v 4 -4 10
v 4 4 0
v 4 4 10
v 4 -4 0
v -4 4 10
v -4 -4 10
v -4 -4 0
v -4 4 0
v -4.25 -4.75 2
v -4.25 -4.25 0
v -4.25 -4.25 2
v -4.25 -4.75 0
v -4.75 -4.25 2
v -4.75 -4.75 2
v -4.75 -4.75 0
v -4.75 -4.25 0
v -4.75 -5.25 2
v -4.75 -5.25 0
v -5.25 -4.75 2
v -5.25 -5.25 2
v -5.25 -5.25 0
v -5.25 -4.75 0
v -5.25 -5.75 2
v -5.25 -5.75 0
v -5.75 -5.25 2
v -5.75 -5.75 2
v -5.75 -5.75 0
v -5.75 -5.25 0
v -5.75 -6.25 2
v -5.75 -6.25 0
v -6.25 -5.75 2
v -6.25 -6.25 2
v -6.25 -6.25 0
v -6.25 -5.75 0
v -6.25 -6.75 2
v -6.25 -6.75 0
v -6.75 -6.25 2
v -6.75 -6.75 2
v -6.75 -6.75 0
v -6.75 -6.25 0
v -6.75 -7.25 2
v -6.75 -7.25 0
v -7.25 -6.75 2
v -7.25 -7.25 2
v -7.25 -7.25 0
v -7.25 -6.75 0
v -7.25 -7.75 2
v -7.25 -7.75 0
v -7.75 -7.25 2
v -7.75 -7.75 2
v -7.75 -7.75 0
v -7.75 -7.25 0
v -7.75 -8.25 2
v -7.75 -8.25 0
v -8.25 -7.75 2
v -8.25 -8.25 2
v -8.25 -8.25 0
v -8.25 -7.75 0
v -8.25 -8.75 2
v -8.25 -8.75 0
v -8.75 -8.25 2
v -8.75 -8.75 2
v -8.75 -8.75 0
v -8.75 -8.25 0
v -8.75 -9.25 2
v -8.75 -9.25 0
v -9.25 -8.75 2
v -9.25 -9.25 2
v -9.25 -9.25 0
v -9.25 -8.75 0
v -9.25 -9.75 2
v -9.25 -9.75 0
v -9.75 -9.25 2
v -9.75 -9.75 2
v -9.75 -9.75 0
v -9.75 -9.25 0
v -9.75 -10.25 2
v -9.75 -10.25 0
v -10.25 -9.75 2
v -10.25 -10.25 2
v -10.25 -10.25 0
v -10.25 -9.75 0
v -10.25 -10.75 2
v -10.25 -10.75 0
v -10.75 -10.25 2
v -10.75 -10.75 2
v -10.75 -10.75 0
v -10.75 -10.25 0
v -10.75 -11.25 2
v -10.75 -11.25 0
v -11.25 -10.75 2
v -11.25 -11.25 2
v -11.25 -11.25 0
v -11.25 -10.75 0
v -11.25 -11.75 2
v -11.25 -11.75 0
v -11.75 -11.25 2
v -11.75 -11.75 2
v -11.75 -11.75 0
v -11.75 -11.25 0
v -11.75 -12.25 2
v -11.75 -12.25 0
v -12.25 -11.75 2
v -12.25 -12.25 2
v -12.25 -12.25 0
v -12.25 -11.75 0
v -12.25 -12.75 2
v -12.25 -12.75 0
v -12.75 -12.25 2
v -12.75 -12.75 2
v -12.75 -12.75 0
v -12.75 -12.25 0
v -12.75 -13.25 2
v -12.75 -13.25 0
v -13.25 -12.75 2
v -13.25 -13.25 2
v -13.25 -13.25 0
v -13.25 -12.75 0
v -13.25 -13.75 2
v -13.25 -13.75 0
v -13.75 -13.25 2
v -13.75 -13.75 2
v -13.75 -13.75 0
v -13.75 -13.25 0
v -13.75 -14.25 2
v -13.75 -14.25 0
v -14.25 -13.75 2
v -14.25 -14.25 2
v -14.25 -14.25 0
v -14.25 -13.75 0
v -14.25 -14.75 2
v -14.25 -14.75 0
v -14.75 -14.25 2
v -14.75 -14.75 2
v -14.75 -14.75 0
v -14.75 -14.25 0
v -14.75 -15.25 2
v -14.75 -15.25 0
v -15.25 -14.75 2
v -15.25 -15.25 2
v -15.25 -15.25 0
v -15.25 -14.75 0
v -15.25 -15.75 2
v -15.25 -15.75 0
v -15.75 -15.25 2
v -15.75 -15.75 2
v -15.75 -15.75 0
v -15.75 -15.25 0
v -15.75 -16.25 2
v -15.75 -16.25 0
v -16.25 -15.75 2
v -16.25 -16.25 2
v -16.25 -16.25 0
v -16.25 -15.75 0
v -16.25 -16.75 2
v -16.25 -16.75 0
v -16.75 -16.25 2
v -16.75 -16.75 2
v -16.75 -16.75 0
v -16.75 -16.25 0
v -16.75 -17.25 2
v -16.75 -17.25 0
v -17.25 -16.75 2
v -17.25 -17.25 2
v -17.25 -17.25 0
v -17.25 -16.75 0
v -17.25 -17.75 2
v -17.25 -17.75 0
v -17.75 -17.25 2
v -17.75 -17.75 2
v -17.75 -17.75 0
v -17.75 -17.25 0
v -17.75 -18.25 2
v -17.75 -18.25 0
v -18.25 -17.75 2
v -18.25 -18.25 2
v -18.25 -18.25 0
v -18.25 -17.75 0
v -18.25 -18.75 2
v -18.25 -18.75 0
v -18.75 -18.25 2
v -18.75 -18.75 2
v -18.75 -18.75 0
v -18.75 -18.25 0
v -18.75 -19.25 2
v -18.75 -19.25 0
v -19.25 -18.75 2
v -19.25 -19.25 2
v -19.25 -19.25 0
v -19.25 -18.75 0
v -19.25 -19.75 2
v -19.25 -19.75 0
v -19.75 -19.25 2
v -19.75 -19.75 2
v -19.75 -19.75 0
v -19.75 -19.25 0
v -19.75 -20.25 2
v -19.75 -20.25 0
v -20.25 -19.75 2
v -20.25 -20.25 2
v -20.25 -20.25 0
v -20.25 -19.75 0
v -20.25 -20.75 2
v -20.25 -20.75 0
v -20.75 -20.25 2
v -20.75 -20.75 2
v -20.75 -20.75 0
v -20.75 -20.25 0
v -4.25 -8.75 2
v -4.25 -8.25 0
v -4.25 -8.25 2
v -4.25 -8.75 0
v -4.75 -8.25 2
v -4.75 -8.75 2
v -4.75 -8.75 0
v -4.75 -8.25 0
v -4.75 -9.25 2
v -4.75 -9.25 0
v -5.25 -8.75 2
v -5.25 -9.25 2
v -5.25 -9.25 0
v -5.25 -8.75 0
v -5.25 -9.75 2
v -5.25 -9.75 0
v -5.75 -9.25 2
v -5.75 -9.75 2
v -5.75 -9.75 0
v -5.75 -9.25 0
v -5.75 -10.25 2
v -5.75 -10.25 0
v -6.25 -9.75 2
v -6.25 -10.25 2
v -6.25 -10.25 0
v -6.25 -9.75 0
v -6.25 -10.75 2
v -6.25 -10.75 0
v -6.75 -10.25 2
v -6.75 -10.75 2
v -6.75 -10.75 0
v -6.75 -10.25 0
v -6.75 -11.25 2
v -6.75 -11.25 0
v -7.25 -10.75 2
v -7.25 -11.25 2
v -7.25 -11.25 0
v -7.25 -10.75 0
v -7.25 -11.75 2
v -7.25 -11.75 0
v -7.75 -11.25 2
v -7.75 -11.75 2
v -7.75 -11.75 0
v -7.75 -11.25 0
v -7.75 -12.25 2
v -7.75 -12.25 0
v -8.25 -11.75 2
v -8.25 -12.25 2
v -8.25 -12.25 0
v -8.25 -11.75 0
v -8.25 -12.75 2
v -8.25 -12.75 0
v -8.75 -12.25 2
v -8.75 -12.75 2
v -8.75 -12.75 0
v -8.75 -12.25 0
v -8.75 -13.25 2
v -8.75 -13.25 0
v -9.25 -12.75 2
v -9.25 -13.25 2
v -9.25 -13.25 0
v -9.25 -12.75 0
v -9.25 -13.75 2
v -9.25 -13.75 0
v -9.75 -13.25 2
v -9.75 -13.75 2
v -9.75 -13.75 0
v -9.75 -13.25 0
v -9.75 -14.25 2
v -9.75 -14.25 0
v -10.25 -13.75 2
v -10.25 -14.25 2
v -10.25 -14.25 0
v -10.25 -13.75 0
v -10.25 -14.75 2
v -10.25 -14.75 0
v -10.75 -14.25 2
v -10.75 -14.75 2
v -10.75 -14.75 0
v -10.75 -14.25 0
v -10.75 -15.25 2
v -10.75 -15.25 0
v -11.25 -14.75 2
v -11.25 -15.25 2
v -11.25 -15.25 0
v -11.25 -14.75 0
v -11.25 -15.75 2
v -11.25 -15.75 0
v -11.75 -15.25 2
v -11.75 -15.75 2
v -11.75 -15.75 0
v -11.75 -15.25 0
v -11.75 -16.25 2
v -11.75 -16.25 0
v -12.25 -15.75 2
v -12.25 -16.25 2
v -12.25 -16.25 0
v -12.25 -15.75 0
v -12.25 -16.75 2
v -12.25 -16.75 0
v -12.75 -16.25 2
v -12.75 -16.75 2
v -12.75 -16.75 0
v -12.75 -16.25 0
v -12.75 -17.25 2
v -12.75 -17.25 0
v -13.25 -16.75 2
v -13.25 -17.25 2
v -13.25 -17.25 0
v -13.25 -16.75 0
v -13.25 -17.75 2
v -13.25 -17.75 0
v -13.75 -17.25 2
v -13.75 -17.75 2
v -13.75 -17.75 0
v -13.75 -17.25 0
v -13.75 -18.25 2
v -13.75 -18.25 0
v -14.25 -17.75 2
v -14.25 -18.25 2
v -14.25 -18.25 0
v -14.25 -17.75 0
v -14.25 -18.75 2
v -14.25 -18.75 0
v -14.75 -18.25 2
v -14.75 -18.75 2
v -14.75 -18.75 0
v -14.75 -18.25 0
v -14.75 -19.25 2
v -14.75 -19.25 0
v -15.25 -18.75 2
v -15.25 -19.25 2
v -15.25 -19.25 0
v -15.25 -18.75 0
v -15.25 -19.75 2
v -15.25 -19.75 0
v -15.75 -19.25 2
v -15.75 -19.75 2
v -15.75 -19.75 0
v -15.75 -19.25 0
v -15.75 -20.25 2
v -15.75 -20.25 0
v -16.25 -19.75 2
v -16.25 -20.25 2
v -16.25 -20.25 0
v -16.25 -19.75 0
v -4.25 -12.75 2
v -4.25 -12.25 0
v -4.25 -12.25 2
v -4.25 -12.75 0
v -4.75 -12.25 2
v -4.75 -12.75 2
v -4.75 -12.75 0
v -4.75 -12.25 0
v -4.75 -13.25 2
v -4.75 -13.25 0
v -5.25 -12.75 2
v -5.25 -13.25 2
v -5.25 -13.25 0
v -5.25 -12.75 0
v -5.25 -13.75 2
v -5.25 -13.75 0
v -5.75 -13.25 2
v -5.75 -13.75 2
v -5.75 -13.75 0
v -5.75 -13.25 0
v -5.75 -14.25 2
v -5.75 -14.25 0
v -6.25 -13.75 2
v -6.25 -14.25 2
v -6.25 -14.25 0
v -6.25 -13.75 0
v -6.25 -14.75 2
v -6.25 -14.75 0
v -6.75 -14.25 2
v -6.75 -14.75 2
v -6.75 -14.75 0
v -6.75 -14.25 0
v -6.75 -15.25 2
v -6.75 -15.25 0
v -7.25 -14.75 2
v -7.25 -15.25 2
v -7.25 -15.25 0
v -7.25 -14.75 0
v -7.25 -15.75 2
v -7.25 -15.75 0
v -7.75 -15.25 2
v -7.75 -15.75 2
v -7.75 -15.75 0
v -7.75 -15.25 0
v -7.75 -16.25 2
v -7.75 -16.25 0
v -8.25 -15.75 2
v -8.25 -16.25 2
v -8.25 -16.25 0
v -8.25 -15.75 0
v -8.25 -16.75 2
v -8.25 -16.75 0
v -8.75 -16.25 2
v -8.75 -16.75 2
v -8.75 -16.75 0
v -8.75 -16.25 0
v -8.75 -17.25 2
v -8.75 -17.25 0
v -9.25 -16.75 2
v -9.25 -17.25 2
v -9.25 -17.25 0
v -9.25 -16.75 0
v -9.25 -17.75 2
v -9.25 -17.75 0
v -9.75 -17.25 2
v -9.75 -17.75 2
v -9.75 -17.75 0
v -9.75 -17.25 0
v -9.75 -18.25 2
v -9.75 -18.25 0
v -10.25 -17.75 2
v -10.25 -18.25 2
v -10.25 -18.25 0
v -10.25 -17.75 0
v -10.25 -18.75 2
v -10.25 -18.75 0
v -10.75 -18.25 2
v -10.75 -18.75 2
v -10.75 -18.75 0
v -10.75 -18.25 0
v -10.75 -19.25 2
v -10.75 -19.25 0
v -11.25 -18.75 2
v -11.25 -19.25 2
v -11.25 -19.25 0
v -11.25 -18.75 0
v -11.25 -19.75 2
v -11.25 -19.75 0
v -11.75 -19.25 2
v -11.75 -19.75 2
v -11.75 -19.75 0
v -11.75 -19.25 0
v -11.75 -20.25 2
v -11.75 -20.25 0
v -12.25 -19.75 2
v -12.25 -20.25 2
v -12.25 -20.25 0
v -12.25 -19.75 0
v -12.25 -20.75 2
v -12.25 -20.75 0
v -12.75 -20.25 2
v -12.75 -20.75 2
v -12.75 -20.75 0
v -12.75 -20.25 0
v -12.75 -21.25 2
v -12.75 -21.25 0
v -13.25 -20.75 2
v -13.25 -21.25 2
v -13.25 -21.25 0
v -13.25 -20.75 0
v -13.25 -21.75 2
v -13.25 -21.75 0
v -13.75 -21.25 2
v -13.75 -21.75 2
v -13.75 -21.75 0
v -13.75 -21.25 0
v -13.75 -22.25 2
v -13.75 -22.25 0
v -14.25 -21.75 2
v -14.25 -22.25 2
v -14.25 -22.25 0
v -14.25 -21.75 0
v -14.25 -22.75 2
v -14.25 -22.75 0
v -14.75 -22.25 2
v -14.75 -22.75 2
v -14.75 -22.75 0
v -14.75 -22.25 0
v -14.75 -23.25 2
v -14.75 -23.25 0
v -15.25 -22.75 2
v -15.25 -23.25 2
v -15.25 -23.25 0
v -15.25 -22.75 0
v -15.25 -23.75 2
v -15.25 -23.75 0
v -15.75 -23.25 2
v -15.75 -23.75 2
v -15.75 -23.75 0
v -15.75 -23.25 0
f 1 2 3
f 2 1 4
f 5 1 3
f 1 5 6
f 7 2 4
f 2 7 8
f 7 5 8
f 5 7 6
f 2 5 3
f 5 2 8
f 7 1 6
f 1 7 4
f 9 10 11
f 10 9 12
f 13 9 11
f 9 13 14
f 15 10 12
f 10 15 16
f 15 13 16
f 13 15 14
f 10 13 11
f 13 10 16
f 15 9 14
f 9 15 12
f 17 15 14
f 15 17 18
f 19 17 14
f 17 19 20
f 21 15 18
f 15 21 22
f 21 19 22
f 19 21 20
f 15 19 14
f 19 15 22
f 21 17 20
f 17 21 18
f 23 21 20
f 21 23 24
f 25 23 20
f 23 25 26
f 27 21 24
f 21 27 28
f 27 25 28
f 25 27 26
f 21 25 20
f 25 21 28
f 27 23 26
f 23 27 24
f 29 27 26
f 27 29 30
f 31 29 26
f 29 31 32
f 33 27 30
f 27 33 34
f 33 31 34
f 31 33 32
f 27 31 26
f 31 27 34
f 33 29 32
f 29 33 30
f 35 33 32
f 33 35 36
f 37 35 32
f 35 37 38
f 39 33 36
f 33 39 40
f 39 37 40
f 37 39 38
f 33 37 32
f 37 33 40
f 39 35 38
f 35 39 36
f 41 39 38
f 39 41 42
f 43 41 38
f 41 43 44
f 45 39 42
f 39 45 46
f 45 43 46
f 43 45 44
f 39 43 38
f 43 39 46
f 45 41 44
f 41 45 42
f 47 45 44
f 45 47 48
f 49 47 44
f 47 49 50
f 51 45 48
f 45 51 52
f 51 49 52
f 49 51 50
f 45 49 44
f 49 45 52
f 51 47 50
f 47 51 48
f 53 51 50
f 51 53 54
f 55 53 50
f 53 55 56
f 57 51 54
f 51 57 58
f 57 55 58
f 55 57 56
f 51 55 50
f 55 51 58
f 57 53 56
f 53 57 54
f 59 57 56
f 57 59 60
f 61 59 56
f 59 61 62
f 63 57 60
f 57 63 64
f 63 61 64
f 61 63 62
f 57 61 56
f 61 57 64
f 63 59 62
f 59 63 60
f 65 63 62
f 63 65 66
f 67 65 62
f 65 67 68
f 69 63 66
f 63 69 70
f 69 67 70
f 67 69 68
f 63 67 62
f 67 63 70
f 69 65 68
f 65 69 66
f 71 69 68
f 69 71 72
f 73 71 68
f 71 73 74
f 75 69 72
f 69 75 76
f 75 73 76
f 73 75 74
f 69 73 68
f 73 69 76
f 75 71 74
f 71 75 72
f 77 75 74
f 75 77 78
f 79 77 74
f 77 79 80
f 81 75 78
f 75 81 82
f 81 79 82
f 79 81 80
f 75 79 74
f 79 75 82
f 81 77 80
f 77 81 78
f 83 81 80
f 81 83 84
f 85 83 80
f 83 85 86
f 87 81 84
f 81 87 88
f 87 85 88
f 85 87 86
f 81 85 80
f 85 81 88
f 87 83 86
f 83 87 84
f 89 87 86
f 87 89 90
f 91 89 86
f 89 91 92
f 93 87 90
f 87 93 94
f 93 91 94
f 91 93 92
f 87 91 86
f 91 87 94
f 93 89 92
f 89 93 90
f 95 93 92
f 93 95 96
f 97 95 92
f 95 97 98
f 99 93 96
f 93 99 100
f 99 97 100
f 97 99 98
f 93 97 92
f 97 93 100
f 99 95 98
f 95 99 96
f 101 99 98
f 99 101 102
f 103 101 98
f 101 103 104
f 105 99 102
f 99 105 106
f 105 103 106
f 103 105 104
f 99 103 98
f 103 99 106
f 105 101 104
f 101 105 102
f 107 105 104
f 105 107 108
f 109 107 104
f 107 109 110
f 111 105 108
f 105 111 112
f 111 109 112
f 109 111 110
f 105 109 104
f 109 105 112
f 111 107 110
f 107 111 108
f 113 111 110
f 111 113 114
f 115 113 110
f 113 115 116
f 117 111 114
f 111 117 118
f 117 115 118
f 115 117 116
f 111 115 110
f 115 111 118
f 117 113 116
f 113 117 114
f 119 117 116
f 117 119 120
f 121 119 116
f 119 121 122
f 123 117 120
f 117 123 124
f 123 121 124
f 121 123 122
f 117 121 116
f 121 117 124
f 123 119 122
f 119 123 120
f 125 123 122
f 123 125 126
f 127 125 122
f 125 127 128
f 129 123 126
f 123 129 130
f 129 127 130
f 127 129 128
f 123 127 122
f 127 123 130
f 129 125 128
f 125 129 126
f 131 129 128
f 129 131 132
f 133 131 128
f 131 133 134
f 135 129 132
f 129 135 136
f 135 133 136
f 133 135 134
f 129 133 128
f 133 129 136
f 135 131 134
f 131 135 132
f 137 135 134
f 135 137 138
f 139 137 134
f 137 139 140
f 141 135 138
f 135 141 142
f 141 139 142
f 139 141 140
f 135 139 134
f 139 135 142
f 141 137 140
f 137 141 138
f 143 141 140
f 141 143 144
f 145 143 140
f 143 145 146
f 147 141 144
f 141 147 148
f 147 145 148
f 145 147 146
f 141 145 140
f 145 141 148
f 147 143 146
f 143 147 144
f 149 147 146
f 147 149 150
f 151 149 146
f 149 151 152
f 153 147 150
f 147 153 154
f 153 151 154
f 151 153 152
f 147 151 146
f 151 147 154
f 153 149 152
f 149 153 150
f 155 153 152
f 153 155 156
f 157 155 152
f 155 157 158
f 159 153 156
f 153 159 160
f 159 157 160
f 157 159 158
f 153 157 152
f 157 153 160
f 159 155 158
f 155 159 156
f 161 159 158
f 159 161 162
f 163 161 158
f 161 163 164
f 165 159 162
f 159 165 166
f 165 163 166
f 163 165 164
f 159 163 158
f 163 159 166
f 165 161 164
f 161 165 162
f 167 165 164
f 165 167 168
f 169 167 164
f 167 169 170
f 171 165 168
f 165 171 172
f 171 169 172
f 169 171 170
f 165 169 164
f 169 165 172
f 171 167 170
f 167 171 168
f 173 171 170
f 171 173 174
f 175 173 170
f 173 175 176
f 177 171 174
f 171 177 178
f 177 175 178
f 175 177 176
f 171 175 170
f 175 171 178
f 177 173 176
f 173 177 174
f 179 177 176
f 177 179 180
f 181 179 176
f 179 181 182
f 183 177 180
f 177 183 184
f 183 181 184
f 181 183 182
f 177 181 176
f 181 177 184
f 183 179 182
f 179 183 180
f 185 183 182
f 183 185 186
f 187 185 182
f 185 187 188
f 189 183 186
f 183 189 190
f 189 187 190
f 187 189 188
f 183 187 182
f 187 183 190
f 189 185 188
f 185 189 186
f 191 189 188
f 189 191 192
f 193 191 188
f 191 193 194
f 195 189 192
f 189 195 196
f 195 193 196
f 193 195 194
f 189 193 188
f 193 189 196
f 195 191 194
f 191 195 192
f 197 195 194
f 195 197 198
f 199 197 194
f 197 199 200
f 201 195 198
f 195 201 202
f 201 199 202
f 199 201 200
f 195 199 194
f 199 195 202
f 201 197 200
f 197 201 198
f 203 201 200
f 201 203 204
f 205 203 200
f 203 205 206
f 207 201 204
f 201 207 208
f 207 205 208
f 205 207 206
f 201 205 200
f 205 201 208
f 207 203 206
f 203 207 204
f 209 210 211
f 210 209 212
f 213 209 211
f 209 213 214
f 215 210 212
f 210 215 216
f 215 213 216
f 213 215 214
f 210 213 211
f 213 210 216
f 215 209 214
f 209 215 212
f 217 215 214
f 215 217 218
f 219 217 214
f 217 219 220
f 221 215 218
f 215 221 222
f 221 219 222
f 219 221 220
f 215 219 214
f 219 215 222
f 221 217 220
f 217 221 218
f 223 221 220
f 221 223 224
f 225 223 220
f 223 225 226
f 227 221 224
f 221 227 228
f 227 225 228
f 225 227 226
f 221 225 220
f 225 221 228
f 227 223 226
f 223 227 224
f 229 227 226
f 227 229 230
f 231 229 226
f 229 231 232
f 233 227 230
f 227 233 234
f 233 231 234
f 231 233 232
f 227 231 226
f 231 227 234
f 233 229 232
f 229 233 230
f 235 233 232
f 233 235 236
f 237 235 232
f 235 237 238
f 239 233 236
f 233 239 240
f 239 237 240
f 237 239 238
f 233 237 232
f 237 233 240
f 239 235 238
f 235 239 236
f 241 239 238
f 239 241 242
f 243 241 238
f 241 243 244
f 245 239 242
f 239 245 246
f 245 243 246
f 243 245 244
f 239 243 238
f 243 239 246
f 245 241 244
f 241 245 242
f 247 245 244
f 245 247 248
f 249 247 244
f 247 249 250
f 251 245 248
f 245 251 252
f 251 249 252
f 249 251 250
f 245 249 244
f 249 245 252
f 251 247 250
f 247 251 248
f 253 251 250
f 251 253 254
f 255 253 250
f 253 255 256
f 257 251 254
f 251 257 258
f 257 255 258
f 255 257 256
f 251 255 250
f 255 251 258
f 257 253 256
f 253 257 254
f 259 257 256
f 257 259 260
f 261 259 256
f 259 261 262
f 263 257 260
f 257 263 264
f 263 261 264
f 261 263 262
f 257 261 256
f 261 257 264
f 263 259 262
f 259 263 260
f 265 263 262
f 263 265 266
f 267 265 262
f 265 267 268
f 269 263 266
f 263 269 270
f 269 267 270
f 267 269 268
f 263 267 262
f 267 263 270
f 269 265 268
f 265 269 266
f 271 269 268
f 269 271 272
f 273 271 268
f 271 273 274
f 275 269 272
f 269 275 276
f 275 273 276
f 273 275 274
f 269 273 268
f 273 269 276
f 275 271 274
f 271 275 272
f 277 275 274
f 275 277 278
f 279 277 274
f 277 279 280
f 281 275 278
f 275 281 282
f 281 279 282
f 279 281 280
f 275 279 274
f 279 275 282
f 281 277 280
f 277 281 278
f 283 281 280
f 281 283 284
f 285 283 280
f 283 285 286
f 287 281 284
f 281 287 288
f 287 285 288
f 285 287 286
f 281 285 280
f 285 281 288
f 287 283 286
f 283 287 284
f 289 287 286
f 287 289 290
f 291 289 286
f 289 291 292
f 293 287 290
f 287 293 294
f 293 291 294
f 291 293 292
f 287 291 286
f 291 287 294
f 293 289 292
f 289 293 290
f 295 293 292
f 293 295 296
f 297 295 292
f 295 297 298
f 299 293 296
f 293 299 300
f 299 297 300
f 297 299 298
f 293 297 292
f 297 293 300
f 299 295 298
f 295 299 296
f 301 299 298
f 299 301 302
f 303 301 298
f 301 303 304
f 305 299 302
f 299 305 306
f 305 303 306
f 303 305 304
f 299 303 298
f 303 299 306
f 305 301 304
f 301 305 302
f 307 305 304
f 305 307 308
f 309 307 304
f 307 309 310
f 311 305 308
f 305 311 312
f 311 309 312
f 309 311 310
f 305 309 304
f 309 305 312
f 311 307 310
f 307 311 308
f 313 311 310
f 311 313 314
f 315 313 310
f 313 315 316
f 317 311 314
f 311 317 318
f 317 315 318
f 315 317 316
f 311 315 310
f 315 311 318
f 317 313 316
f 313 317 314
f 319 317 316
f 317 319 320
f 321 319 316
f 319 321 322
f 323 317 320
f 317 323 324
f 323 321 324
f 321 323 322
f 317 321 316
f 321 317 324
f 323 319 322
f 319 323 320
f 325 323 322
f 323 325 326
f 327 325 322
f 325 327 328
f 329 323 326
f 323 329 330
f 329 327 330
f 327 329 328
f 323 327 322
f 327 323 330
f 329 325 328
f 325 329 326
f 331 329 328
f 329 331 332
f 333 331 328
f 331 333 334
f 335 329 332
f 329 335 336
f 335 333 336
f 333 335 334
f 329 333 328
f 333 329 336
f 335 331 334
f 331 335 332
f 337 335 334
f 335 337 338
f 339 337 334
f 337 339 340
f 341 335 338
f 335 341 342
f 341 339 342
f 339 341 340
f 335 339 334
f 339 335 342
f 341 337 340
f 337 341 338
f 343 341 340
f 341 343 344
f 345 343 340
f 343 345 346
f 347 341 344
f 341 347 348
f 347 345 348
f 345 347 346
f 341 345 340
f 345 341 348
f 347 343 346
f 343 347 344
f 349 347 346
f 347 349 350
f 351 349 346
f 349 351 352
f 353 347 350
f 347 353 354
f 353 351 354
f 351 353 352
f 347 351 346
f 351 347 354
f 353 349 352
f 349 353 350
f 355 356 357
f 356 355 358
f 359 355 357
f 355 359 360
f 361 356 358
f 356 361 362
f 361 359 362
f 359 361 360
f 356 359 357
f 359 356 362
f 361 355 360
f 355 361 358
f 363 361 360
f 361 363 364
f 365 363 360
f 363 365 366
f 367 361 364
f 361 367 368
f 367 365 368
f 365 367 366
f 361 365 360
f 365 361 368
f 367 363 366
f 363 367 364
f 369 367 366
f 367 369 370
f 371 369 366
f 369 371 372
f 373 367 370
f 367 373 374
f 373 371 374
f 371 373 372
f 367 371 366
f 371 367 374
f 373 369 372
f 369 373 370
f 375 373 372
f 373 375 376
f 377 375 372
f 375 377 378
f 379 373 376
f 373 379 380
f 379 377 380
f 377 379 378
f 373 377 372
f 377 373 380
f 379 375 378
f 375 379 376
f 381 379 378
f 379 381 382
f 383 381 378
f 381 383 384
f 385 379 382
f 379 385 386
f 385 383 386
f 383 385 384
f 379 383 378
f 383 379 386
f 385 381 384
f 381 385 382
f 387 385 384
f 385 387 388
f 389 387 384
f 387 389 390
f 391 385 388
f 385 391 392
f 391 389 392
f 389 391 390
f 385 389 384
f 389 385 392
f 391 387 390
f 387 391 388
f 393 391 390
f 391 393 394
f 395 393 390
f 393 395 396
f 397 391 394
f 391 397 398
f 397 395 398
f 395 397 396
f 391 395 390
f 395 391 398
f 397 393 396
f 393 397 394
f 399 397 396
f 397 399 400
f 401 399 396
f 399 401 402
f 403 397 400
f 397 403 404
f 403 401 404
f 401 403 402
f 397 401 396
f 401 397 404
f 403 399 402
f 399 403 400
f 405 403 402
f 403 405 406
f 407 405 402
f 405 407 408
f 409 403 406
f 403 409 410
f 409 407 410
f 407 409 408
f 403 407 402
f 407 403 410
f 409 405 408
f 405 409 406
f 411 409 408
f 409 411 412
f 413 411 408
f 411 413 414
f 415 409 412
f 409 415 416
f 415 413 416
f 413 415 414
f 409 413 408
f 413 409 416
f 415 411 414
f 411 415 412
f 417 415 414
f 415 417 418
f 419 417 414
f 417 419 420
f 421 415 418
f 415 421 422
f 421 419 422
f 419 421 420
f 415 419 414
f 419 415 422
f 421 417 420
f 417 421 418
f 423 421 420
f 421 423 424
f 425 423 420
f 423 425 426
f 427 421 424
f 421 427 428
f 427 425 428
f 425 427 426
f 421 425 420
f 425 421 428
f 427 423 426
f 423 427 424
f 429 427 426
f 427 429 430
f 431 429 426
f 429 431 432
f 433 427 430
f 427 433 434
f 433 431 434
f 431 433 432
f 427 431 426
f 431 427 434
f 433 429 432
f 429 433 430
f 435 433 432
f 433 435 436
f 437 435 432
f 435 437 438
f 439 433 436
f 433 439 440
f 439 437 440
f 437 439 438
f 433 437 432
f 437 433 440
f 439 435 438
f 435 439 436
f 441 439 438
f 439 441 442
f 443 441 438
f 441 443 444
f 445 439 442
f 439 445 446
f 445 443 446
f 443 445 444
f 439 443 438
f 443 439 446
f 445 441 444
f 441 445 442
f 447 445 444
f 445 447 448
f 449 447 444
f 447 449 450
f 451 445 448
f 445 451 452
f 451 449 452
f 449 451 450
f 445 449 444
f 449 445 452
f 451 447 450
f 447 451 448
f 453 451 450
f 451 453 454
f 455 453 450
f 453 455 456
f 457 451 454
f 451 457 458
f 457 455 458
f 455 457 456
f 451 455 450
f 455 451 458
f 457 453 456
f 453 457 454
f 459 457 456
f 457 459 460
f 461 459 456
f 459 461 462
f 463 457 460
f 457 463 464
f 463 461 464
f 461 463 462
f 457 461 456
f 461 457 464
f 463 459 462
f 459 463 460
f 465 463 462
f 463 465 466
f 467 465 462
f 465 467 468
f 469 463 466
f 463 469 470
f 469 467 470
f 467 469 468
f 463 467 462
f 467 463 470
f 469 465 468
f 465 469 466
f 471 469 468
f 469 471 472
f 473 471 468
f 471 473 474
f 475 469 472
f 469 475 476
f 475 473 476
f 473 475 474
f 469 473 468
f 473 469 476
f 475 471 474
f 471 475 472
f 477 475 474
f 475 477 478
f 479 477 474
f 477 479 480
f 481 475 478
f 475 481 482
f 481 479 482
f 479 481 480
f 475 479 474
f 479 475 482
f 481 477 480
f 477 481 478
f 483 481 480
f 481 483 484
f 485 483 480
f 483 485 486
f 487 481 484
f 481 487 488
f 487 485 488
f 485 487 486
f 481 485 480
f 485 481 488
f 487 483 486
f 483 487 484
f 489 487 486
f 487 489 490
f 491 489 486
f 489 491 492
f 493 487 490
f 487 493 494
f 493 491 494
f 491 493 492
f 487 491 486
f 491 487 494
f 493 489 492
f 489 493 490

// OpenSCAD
translate([0, 0, 5]) color([0,1,0,0.9]) cube([8, 8, 10], center=true);
translate([-4.5, -4.5, 1]) color([1,0,0]) cube([0.5, 0.5, 2], center=true);
translate([-5, -5, 1]) color([1,0,0]) cube([0.5, 0.5, 2], center=true);
translate([-5.5, -5.5, 1]) color([1,0,0]) cube([0.5, 0.5, 2], center=true);
translate([-6, -6, 1]) color([1,0,0]) cube([0.5, 0.5, 2], center=true);
translate([-6.5, -6.5, 1]) color([1,0,0]) cube([0.5, 0.5, 2], center=true);
translate([-7, -7, 1]) color([1,0,0]) cube([0.5, 0.5, 2], center=true);
translate([-7.5, -7.5, 1]) color([1,0,0]) cube([0.5, 0.5, 2], center=true);
translate([-8, -8, 1]) color([1,0,0]) cube([0.5, 0.5, 2], center=true);
translate([-8.5, -8.5, 1]) color([1,0,0]) cube([0.5, 0.5, 2], center=true);
translate([-9, -9, 1]) color([1,0,0]) cube([0.5, 0.5, 2], center=true);
translate([-9.5, -9.5, 1]) color([1,0,0]) cube([0.5, 0.5, 2], center=true);
translate([-10, -10, 1]) color([1,0,0]) cube([0.5, 0.5, 2], center=true);
translate([-10.5, -10.5, 1]) color([1,0,0]) cube([0.5, 0.5, 2], center=true);
translate([-11, -11, 1]) color([1,0,0]) cube([0.5, 0.5, 2], center=true);
translate([-11.5, -11.5, 1]) color([1,0,0]) cube([0.5, 0.5, 2], center=true);
translate([-12, -12, 1]) color([1,0,0]) cube([0.5, 0.5, 2], center=true);
translate([-12.5, -12.5, 1]) color([1,0,0]) cube([0.5, 0.5, 2], center=true);
translate([-13, -13, 1]) color([1,0,0]) cube([0.5, 0.5, 2], center=true);
translate([-13.5, -13.5, 1]) color([1,0,0]) cube([0.5, 0.5, 2], center=true);
translate([-14, -14, 1]) color([1,0,0]) cube([0.5, 0.5, 2], center=true);
translate([-14.5, -14.5, 1]) color([1,0,0]) cube([0.5, 0.5, 2], center=true);
translate([-15, -15, 1]) color([1,0,0]) cube([0.5, 0.5, 2], center=true);
translate([-15.5, -15.5, 1]) color([1,0,0]) cube([0.5, 0.5, 2], center=true);
translate([-16, -16, 1]) color([1,0,0]) cube([0.5, 0.5, 2], center=true);
translate([-16.5, -16.5, 1]) color([1,0,0]) cube([0.5, 0.5, 2], center=true);
translate([-17, -17, 1]) color([1,0,0]) cube([0.5, 0.5, 2], center=true);
translate([-17.5, -17.5, 1]) color([1,0,0]) cube([0.5, 0.5, 2], center=true);
translate([-18, -18, 1]) color([1,0,0]) cube([0.5, 0.5, 2], center=true);
translate([-18.5, -18.5, 1]) color([1,0,0]) cube([0.5, 0.5, 2], center=true);
translate([-19, -19, 1]) color([1,0,0]) cube([0.5, 0.5, 2], center=true);
translate([-19.5, -19.5, 1]) color([1,0,0]) cube([0.5, 0.5, 2], center=true);
translate([-20, -20, 1]) color([1,0,0]) cube([0.5, 0.5, 2], center=true);
translate([-20.5, -20.5, 1]) color([1,0,0]) cube([0.5, 0.5, 2], center=true);
translate([-4.5, -8.5, 1]) color([1,0,0]) cube([0.5, 0.5, 2], center=true);
translate([-5, -9, 1]) color([1,0,0]) cube([0.5, 0.5, 2], center=true);
translate([-5.5, -9.5, 1]) color([1,0,0]) cube([0.5, 0.5, 2], center=true);
translate([-6, -10, 1]) color([1,0,0]) cube([0.5, 0.5, 2], center=true);
translate([-6.5, -10.5, 1]) color([1,0,0]) cube([0.5, 0.5, 2], center=true);
translate([-7, -11, 1]) color([1,0,0]) cube([0.5, 0.5, 2], center=true);
translate([-7.5, -11.5, 1]) color([1,0,0]) cube([0.5, 0.5, 2], center=true);
translate([-8, -12, 1]) color([1,0,0]) cube([0.5, 0.5, 2], center=true);
translate([-8.5, -12.5, 1]) color([1,0,0]) cube([0.5, 0.5, 2], center=true);
translate([-9, -13, 1]) color([1,0,0]) cube([0.5, 0.5, 2], center=true);
translate([-9.5, -13.5, 1]) color([1,0,0]) cube([0.5, 0.5, 2], center=true);
translate([-10, -14, 1]) color([1,0,0]) cube([0.5, 0.5, 2], center=true);
translate([-10.5, -14.5, 1]) color([1,0,0]) cube([0.5, 0.5, 2], center=true);
translate([-11, -15, 1]) color([1,0,0]) cube([0.5, 0.5, 2], center=true);
translate([-11.5, -15.5, 1]) color([1,0,0]) cube([0.5, 0.5, 2], center=true);
translate([-12, -16, 1]) color([1,0,0]) cube([0.5, 0.5, 2], center=true);
translate([-12.5, -16.5, 1]) color([1,0,0]) cube([0.5, 0.5, 2], center=true);
translate([-13, -17, 1]) color([1,0,0]) cube([0.5, 0.5, 2], center=true);
translate([-13.5, -17.5, 1]) color([1,0,0]) cube([0.5, 0.5, 2], center=true);
translate([-14, -18, 1]) color([1,0,0]) cube([0.5, 0.5, 2], center=true);
translate([-14.5, -18.5, 1]) color([1,0,0]) cube([0.5, 0.5, 2], center=true);
translate([-15, -19, 1]) color([1,0,0]) cube([0.5, 0.5, 2], center=true);
translate([-15.5, -19.5, 1]) color([1,0,0]) cube([0.5, 0.5, 2], center=true);
translate([-16, -20, 1]) color([1,0,0]) cube([0.5, 0.5, 2], center=true);
translate([-4.5, -12.5, 1]) color([1,0,0]) cube([0.5, 0.5, 2], center=true);
translate([-5, -13, 1]) color([1,0,0]) cube([0.5, 0.5, 2], center=true);
translate([-5.5, -13.5, 1]) color([1,0,0]) cube([0.5, 0.5, 2], center=true);
translate([-6, -14, 1]) color([1,0,0]) cube([0.5, 0.5, 2], center=true);
translate([-6.5, -14.5, 1]) color([1,0,0]) cube([0.5, 0.5, 2], center=true);
translate([-7, -15, 1]) color([1,0,0]) cube([0.5, 0.5, 2], center=true);
translate([-7.5, -15.5, 1]) color([1,0,0]) cube([0.5, 0.5, 2], center=true);
translate([-8, -16, 1]) color([1,0,0]) cube([0.5, 0.5, 2], center=true);
translate([-8.5, -16.5, 1]) color([1,0,0]) cube([0.5, 0.5, 2], center=true);
translate([-9, -17, 1]) color([1,0,0]) cube([0.5, 0.5, 2], center=true);
translate([-9.5, -17.5, 1]) color([1,0,0]) cube([0.5, 0.5, 2], center=true);
translate([-10, -18, 1]) color([1,0,0]) cube([0.5, 0.5, 2], center=true);
translate([-10.5, -18.5, 1]) color([1,0,0]) cube([0.5, 0.5, 2], center=true);
translate([-11, -19, 1]) color([1,0,0]) cube([0.5, 0.5, 2], center=true);
translate([-11.5, -19.5, 1]) color([1,0,0]) cube([0.5, 0.5, 2], center=true);
translate([-12, -20, 1]) color([1,0,0]) cube([0.5, 0.5, 2], center=true);
translate([-12.5, -20.5, 1]) color([1,0,0]) cube([0.5, 0.5, 2], center=true);
translate([-13, -21, 1]) color([1,0,0]) cube([0.5, 0.5, 2], center=true);
translate([-13.5, -21.5, 1]) color([1,0,0]) cube([0.5, 0.5, 2], center=true);
translate([-14, -22, 1]) color([1,0,0]) cube([0.5, 0.5, 2], center=true);
translate([-14.5, -22.5, 1]) color([1,0,0]) cube([0.5, 0.5, 2], center=true);
translate([-15, -23, 1]) color([1,0,0]) cube([0.5, 0.5, 2], center=true);
translate([-15.5, -23.5, 1]) color([1,0,0]) cube([0.5, 0.5, 2], center=true);
